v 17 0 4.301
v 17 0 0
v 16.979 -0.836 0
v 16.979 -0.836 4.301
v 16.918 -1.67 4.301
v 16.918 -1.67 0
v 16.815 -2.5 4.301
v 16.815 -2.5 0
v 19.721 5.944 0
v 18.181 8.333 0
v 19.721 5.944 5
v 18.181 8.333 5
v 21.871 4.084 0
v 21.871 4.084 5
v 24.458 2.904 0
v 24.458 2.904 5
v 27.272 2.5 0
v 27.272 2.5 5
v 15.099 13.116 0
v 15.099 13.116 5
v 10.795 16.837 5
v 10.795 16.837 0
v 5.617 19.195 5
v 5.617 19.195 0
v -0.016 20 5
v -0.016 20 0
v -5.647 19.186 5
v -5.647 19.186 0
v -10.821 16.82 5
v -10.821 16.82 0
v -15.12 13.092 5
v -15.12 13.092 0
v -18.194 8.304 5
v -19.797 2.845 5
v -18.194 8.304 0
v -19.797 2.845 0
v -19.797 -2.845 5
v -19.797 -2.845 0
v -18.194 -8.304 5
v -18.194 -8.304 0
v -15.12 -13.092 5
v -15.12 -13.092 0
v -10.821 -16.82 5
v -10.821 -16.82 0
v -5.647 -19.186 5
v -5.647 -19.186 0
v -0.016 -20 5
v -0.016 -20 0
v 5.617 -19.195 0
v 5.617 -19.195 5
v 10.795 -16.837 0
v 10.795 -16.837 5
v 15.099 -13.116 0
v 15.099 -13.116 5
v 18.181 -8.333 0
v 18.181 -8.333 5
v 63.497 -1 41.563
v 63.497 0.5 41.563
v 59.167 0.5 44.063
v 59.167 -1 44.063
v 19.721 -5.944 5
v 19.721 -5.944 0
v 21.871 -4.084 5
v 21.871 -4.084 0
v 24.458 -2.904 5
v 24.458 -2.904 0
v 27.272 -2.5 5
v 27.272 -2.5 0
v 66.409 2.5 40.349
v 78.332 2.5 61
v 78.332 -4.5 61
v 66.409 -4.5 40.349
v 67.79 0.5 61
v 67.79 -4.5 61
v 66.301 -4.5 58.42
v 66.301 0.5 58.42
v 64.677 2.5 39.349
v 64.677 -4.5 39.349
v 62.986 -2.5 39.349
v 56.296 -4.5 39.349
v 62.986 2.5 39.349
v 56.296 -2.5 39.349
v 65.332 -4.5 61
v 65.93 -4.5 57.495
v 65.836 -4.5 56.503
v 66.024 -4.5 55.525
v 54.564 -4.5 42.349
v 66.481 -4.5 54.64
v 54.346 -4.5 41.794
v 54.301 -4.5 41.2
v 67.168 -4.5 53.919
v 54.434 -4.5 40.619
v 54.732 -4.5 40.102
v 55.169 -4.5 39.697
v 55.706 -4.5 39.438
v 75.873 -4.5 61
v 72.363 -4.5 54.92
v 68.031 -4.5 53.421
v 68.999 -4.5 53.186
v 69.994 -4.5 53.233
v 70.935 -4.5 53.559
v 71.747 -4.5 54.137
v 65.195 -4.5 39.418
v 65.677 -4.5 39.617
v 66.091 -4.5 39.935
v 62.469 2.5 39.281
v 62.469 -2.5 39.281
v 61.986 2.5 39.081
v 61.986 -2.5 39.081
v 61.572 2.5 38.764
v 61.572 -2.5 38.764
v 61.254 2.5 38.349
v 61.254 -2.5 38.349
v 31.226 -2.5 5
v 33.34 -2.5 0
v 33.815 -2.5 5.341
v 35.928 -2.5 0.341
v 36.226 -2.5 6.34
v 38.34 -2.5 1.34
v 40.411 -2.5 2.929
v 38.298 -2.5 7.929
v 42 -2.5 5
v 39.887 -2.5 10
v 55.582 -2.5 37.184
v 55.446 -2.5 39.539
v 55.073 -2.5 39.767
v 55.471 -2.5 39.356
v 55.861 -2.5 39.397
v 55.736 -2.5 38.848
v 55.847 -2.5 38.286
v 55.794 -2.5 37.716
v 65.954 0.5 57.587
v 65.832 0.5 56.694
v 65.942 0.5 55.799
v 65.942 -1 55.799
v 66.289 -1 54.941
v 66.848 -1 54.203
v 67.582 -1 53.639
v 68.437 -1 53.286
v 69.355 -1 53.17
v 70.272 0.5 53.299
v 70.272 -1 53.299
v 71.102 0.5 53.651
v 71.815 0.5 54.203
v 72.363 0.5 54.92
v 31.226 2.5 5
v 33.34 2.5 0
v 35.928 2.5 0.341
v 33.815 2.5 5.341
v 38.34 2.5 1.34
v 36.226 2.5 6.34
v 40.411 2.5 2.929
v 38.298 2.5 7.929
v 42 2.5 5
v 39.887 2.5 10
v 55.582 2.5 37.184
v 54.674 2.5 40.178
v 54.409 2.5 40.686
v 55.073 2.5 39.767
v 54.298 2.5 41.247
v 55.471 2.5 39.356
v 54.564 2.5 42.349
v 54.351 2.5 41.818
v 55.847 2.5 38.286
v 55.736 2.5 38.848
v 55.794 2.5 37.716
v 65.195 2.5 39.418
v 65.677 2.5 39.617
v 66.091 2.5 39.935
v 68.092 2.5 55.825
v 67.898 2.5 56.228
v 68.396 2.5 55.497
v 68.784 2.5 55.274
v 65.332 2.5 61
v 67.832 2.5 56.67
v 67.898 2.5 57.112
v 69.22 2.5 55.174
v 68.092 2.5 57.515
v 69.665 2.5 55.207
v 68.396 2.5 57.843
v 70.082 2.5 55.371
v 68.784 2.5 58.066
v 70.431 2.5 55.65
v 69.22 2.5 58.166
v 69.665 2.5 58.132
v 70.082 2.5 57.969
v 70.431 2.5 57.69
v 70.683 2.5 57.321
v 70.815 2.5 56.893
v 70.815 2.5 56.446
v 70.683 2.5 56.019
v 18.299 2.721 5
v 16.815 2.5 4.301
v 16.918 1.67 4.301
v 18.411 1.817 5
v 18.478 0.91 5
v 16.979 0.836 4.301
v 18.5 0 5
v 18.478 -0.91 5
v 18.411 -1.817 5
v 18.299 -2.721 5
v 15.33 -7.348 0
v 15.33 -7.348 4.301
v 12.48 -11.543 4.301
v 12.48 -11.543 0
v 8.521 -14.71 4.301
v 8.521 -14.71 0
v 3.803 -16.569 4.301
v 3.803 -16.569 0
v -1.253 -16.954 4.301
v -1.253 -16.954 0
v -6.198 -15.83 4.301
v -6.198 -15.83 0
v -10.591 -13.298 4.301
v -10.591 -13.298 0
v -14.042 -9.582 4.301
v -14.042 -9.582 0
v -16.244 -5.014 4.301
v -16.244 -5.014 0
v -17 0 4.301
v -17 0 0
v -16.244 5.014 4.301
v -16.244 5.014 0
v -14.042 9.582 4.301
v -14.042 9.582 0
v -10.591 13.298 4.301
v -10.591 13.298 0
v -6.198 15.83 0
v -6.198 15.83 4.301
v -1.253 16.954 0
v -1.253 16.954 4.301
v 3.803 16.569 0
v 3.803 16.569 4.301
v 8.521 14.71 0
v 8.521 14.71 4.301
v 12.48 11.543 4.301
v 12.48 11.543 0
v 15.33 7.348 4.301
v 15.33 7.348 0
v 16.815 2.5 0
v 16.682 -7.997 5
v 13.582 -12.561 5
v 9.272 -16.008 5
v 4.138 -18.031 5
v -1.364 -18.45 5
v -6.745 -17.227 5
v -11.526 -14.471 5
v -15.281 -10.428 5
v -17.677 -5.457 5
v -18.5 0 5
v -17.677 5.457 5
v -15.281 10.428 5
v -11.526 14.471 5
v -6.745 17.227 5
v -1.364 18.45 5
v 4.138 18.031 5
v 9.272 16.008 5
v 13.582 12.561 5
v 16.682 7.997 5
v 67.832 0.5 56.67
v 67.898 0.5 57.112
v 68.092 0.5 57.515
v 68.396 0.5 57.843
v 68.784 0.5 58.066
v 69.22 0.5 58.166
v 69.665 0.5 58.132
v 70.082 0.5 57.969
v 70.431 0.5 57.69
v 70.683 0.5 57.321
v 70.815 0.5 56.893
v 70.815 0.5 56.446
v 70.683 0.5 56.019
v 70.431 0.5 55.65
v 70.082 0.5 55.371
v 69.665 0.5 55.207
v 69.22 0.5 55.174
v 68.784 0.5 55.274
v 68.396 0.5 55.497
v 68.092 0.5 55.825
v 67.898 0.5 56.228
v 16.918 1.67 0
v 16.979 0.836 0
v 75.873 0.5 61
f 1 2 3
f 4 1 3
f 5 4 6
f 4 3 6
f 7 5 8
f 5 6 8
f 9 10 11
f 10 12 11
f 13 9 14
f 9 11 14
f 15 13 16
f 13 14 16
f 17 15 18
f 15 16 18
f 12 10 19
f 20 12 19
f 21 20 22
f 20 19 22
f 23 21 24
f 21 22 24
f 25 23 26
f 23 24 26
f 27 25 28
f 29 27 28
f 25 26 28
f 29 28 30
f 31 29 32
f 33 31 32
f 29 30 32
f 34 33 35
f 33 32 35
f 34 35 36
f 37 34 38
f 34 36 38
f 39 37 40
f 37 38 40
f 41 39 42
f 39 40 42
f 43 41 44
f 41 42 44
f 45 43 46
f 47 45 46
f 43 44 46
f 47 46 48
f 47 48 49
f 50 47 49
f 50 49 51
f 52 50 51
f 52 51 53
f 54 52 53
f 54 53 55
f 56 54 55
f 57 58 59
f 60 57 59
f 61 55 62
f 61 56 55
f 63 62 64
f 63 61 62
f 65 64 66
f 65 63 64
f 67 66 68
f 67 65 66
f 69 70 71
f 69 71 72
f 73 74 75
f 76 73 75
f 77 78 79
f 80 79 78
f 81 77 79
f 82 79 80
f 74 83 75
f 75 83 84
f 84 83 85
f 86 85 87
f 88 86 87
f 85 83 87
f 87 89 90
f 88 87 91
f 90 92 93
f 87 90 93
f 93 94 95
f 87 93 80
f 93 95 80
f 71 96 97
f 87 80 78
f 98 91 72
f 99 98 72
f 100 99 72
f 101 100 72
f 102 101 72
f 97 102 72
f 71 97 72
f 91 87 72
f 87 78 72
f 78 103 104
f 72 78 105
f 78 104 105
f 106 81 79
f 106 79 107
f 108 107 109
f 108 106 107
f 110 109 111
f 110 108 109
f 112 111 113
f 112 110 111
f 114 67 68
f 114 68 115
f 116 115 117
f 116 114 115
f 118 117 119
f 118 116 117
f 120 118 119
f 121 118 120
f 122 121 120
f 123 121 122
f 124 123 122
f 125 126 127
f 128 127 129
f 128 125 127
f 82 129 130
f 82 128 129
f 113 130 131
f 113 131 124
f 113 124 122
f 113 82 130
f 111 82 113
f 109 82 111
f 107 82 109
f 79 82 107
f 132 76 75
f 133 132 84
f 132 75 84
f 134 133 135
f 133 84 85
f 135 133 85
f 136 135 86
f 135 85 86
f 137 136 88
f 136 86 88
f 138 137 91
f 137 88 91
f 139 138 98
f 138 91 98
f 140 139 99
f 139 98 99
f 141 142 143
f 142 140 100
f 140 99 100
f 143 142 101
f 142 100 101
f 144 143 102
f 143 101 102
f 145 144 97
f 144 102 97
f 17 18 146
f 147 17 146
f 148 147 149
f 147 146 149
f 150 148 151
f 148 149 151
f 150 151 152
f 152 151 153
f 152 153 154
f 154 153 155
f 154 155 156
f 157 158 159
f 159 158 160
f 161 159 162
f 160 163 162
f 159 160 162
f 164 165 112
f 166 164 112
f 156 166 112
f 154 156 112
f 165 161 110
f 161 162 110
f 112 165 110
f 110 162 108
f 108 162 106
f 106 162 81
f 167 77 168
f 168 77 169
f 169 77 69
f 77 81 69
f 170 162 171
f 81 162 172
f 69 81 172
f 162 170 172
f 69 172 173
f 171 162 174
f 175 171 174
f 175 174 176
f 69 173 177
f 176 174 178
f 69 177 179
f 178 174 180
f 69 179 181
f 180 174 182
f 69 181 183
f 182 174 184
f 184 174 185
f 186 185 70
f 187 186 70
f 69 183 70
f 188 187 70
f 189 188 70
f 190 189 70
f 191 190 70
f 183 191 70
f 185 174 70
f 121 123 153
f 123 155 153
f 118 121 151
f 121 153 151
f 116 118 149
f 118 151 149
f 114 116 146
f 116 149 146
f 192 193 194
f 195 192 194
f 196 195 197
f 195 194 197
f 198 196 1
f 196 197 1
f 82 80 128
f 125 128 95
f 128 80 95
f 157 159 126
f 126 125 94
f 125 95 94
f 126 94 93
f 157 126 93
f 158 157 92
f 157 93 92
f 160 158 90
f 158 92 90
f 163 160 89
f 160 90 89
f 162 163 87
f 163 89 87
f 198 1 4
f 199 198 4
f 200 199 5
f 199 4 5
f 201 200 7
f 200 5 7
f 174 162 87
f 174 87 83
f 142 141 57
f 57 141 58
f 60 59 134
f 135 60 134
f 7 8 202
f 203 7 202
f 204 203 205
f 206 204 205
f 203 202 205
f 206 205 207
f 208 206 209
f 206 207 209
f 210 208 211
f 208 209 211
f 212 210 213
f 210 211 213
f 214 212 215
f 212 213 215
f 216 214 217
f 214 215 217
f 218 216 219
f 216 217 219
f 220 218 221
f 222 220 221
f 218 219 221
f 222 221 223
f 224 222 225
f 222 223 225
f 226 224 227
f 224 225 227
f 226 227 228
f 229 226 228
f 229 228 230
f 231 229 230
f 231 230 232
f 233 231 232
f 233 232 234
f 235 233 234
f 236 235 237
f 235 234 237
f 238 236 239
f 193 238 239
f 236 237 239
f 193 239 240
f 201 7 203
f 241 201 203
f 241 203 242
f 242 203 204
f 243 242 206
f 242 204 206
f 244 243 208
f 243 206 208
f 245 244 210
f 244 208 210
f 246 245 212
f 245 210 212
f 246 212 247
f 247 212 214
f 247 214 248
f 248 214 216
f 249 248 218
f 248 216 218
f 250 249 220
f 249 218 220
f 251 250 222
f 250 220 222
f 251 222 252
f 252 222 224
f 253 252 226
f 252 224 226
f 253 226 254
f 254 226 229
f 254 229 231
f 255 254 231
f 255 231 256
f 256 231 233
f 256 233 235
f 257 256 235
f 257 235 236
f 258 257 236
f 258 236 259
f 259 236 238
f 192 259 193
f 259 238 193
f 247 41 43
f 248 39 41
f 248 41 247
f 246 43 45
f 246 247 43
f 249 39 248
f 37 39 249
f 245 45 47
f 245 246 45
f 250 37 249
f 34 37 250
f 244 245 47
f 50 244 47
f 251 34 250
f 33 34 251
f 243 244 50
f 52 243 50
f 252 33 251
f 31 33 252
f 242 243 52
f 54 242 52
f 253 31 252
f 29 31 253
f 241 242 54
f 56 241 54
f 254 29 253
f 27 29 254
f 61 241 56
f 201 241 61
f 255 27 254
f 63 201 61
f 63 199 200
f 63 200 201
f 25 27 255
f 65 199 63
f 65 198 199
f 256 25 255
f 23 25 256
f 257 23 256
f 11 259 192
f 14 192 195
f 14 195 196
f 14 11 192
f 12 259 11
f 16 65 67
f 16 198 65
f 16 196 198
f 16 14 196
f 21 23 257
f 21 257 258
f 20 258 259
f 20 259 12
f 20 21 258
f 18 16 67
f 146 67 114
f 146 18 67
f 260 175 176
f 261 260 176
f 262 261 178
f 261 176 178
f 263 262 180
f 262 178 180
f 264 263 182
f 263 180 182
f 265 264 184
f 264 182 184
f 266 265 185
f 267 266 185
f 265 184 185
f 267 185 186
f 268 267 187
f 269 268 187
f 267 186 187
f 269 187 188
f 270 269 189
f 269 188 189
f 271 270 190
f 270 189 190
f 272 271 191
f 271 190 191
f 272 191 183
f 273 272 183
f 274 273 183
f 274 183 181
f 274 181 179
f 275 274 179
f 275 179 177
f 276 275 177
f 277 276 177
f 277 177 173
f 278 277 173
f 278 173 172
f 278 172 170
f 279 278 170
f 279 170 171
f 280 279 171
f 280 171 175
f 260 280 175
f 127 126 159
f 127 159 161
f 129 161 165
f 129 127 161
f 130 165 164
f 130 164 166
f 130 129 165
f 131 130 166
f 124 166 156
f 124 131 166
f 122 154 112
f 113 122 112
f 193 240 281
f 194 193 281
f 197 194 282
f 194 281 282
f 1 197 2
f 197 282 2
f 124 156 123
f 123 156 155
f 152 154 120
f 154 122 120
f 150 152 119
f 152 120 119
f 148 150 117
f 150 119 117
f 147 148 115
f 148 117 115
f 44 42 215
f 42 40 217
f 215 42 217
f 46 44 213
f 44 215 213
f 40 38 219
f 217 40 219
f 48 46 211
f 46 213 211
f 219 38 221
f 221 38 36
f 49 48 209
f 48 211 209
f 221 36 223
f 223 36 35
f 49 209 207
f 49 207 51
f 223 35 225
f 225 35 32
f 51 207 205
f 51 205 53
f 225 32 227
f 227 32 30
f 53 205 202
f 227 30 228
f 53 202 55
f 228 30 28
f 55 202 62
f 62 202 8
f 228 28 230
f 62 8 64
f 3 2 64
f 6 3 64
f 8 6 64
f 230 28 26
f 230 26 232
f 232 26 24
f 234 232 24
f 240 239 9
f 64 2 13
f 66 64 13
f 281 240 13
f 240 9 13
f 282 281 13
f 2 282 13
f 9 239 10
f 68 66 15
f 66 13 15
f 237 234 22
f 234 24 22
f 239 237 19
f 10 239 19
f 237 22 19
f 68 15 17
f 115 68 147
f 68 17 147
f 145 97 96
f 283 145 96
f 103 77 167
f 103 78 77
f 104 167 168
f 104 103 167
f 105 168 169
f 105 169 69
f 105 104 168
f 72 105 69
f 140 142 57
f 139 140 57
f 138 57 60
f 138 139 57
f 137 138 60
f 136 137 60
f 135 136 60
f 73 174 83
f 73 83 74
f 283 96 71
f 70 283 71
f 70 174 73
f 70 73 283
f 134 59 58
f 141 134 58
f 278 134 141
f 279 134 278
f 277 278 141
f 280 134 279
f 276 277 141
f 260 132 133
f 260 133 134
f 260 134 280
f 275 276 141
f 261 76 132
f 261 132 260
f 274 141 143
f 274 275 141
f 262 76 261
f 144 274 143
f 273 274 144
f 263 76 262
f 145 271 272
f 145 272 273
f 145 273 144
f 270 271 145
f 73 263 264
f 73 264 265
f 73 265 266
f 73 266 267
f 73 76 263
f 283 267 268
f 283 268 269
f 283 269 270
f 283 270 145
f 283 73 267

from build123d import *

# Parameters (mm, degrees)
BOSS_EXTRUDE1_DEPTH = 5
CHAMFER2_SIZE       = 1.5
CHAMFER2_SIZE2      = 0.699461487
FILLET1_R           = 10
BOSS_EXTRUDE2_DEPTH = 5
BOSS_EXTRUDE3_DEPTH = 7
CUT_EXTRUDE1_DEPTH  = 5
CUT_EXTRUDE2_DEPTH  = 1.5
SKETCH11_R          = 1.5
CUT_EXTRUDE3_DEPTH  = 102.79927269
FILLET2_R           = 10
FILLET3_R           = 2
FILLET4_R           = 2


with BuildPart() as part:
    # Sketch1 → Boss-Extrude1 (new body)
    with BuildSketch(Plane.XY):
        with BuildLine():
            ThreePointArc((16.815171721, -2.5), (-17, 0), (16.815171721, 2.5))
            Line((16.815171721, 2.5), (19.843134833, 2.5))
            ThreePointArc((19.843134833, 2.5), (-20, 0), (19.843134833, -2.5))
            Line((19.843134833, -2.5), (16.815171721, -2.5))
        make_face()
        with BuildLine():
            Line((19.843134833, 2.5), (16.815171721, 2.5))
            ThreePointArc((16.815171721, 2.5), (16.953729962, 1.253411494), (17, 0))
            ThreePointArc((17, 0), (16.953729962, -1.253411494), (16.815171721, -2.5))
            Line((16.815171721, -2.5), (19.843134833, -2.5))
            ThreePointArc((19.843134833, -2.5), (19.960745185, -1.252458251), (20, 0))
            ThreePointArc((20, 0), (19.960745185, 1.252458251), (19.843134833, 2.5))
        make_face()
        with BuildLine():
            Line((37, 2.5), (19.843134833, 2.5))
            ThreePointArc((19.843134833, 2.5), (19.960745185, 1.252458251), (20, 0))
            ThreePointArc((20, 0), (19.960745185, -1.252458251), (19.843134833, -2.5))
            Line((19.843134833, -2.5), (37, -2.5))
            Line((37, -2.5), (37, 2.5))
        make_face()
    extrude(amount=BOSS_EXTRUDE1_DEPTH)

    # Chamfer2
    chamfer2_edges = [part.edges().sort_by_distance(p)[0] for p in [
        (-16.815171721, -2.5, 5),
    ]]
    chamfer2_side = [part.faces().sort_by_distance(p)[0] for p in [
        (-17.503948469, -2.602404061, 5),
    ]]
    chamfer(chamfer2_edges, length=CHAMFER2_SIZE, length2=CHAMFER2_SIZE2, reference=chamfer2_side[0])

    # Fillet1
    fillet1_edges = [part.edges().sort_by_distance(p)[0] for p in [
        (19.843134833, 2.5, 2.5),
        (19.843134833, -2.5, 2.5),
    ]]
    fillet(fillet1_edges, radius=FILLET1_R)

    # Sketch3 → Boss-Extrude2 (add)
    with BuildSketch(Plane(origin=(0, 2.5, 0), x_dir=(1, 0, 0), z_dir=(0, 1, 0))):
        Polygon((39.113248654, 0), (74.331615075, -61), (69.331615075, -61), (37, -5), (37, 0), align=None)
    extrude(amount=-BOSS_EXTRUDE2_DEPTH)

    # Sketch5 → Boss-Extrude3 (add)
    with BuildSketch(Plane(origin=(0, 2.5, 0), x_dir=(1, 0, 0), z_dir=(0, 1, 0))):
        Polygon((65.331615075, -61), (78.331615075, -61), (65.831615075, -39.349364905), (52.831615075, -39.349364905), align=None)
    extrude(amount=-BOSS_EXTRUDE3_DEPTH)

    # Sketch9 → Cut-Extrude1 (cut)
    with BuildSketch(Plane.XZ.offset(4.5)):
        with BuildLine():
            Line((75.873066959, 61), (67.79016319, 61))
            Line((67.79016319, 61), (66.300526161, 58.419872981))
            ThreePointArc((66.300526161, 58.419872981), (67.581615075, 53.638784068), (72.362703988, 54.919872981))
            Line((72.362703988, 54.919872981), (75.873066959, 61))
        make_face()
    extrude(amount=-CUT_EXTRUDE1_DEPTH, mode=Mode.SUBTRACT)

    # Sketch10 → Cut-Extrude2 (cut)
    with BuildSketch(Plane.XZ.offset(-0.5)):
        Polygon((67.166551565, 57.919872981), (71.496678584, 55.419872981), (63.496678584, 41.563466521), (59.166551565, 44.063466521), align=None)
    extrude(amount=CUT_EXTRUDE2_DEPTH, mode=Mode.SUBTRACT)

    # Sketch11 → Cut-Extrude3 (cut, through all)
    with BuildSketch(Plane(origin=(0, 2.5, 0), x_dir=(1, 0, 0), z_dir=(0, 1, 0))):
        with Locations(Location((69.331615075, -56.669872981, 0), (0, 0, 180))):
            Circle(SKETCH11_R)
    extrude(amount=-CUT_EXTRUDE3_DEPTH, mode=Mode.SUBTRACT)

    # Fillet2
    fillet2_edges = [part.edges().sort_by_distance(p)[0] for p in [
        (37, 0, 5),
        (39.113248654, 0, 0),
    ]]
    fillet(fillet2_edges, radius=FILLET2_R)

    # Fillet3
    fillet3_edges = [part.edges().sort_by_distance(p)[0] for p in [
        (52.831615075, -1, 39.349364905),
        (65.831615075, -1, 39.349364905),
    ]]
    fillet(fillet3_edges, radius=FILLET3_R)

    # Fillet4
    # the kernel refuses this fillet: 2 mm, written as the material it adds along each edge
    with BuildSketch(Plane(origin=(61.831615075, 2.5, 39.349364905), x_dir=(1, 0, 0), z_dir=(0, -1, 0))) as fillet4_piece_1:
        with BuildLine():
            CenterArc((FILLET4_R * 0.57735026919, -FILLET4_R), FILLET4_R, 90, 60)
            Line((-FILLET4_R * 0.288675134595, -FILLET4_R * 0.5), (0, 0))
            Line((0, 0), (FILLET4_R * 0.57735026919, 0))
        make_face()
    extrude(amount=5)
    with BuildSketch(Plane(origin=(56.831615075, -2.5, 39.349364905), x_dir=(-0.9729624343176315, 0, 0.2309634200619407), z_dir=(0, 1, 0))) as fillet4_piece_2:
        with BuildLine():
            CenterArc((2.632289796, -1.822151945), FILLET4_R, 114.345531007, 82.300670054)
            Line((0.716106006, -2.395074001), (0.524487627, -2.452366207))
            Line((0.524487627, -2.452366207), (-0.191618379, -0.057292206))
            Line((-0.191618379, -0.057292206), (0.046192684, 0.194592487))
            ThreePointArc((0.046192684, 0.194592487), (0.567601681, 0.070819563), (1.725365119, 0.182215194))
            Line((1.725365119, 0.182215194), (1.807812817, 0))
        make_face()
    extrude(amount=5)


solid = part.part
